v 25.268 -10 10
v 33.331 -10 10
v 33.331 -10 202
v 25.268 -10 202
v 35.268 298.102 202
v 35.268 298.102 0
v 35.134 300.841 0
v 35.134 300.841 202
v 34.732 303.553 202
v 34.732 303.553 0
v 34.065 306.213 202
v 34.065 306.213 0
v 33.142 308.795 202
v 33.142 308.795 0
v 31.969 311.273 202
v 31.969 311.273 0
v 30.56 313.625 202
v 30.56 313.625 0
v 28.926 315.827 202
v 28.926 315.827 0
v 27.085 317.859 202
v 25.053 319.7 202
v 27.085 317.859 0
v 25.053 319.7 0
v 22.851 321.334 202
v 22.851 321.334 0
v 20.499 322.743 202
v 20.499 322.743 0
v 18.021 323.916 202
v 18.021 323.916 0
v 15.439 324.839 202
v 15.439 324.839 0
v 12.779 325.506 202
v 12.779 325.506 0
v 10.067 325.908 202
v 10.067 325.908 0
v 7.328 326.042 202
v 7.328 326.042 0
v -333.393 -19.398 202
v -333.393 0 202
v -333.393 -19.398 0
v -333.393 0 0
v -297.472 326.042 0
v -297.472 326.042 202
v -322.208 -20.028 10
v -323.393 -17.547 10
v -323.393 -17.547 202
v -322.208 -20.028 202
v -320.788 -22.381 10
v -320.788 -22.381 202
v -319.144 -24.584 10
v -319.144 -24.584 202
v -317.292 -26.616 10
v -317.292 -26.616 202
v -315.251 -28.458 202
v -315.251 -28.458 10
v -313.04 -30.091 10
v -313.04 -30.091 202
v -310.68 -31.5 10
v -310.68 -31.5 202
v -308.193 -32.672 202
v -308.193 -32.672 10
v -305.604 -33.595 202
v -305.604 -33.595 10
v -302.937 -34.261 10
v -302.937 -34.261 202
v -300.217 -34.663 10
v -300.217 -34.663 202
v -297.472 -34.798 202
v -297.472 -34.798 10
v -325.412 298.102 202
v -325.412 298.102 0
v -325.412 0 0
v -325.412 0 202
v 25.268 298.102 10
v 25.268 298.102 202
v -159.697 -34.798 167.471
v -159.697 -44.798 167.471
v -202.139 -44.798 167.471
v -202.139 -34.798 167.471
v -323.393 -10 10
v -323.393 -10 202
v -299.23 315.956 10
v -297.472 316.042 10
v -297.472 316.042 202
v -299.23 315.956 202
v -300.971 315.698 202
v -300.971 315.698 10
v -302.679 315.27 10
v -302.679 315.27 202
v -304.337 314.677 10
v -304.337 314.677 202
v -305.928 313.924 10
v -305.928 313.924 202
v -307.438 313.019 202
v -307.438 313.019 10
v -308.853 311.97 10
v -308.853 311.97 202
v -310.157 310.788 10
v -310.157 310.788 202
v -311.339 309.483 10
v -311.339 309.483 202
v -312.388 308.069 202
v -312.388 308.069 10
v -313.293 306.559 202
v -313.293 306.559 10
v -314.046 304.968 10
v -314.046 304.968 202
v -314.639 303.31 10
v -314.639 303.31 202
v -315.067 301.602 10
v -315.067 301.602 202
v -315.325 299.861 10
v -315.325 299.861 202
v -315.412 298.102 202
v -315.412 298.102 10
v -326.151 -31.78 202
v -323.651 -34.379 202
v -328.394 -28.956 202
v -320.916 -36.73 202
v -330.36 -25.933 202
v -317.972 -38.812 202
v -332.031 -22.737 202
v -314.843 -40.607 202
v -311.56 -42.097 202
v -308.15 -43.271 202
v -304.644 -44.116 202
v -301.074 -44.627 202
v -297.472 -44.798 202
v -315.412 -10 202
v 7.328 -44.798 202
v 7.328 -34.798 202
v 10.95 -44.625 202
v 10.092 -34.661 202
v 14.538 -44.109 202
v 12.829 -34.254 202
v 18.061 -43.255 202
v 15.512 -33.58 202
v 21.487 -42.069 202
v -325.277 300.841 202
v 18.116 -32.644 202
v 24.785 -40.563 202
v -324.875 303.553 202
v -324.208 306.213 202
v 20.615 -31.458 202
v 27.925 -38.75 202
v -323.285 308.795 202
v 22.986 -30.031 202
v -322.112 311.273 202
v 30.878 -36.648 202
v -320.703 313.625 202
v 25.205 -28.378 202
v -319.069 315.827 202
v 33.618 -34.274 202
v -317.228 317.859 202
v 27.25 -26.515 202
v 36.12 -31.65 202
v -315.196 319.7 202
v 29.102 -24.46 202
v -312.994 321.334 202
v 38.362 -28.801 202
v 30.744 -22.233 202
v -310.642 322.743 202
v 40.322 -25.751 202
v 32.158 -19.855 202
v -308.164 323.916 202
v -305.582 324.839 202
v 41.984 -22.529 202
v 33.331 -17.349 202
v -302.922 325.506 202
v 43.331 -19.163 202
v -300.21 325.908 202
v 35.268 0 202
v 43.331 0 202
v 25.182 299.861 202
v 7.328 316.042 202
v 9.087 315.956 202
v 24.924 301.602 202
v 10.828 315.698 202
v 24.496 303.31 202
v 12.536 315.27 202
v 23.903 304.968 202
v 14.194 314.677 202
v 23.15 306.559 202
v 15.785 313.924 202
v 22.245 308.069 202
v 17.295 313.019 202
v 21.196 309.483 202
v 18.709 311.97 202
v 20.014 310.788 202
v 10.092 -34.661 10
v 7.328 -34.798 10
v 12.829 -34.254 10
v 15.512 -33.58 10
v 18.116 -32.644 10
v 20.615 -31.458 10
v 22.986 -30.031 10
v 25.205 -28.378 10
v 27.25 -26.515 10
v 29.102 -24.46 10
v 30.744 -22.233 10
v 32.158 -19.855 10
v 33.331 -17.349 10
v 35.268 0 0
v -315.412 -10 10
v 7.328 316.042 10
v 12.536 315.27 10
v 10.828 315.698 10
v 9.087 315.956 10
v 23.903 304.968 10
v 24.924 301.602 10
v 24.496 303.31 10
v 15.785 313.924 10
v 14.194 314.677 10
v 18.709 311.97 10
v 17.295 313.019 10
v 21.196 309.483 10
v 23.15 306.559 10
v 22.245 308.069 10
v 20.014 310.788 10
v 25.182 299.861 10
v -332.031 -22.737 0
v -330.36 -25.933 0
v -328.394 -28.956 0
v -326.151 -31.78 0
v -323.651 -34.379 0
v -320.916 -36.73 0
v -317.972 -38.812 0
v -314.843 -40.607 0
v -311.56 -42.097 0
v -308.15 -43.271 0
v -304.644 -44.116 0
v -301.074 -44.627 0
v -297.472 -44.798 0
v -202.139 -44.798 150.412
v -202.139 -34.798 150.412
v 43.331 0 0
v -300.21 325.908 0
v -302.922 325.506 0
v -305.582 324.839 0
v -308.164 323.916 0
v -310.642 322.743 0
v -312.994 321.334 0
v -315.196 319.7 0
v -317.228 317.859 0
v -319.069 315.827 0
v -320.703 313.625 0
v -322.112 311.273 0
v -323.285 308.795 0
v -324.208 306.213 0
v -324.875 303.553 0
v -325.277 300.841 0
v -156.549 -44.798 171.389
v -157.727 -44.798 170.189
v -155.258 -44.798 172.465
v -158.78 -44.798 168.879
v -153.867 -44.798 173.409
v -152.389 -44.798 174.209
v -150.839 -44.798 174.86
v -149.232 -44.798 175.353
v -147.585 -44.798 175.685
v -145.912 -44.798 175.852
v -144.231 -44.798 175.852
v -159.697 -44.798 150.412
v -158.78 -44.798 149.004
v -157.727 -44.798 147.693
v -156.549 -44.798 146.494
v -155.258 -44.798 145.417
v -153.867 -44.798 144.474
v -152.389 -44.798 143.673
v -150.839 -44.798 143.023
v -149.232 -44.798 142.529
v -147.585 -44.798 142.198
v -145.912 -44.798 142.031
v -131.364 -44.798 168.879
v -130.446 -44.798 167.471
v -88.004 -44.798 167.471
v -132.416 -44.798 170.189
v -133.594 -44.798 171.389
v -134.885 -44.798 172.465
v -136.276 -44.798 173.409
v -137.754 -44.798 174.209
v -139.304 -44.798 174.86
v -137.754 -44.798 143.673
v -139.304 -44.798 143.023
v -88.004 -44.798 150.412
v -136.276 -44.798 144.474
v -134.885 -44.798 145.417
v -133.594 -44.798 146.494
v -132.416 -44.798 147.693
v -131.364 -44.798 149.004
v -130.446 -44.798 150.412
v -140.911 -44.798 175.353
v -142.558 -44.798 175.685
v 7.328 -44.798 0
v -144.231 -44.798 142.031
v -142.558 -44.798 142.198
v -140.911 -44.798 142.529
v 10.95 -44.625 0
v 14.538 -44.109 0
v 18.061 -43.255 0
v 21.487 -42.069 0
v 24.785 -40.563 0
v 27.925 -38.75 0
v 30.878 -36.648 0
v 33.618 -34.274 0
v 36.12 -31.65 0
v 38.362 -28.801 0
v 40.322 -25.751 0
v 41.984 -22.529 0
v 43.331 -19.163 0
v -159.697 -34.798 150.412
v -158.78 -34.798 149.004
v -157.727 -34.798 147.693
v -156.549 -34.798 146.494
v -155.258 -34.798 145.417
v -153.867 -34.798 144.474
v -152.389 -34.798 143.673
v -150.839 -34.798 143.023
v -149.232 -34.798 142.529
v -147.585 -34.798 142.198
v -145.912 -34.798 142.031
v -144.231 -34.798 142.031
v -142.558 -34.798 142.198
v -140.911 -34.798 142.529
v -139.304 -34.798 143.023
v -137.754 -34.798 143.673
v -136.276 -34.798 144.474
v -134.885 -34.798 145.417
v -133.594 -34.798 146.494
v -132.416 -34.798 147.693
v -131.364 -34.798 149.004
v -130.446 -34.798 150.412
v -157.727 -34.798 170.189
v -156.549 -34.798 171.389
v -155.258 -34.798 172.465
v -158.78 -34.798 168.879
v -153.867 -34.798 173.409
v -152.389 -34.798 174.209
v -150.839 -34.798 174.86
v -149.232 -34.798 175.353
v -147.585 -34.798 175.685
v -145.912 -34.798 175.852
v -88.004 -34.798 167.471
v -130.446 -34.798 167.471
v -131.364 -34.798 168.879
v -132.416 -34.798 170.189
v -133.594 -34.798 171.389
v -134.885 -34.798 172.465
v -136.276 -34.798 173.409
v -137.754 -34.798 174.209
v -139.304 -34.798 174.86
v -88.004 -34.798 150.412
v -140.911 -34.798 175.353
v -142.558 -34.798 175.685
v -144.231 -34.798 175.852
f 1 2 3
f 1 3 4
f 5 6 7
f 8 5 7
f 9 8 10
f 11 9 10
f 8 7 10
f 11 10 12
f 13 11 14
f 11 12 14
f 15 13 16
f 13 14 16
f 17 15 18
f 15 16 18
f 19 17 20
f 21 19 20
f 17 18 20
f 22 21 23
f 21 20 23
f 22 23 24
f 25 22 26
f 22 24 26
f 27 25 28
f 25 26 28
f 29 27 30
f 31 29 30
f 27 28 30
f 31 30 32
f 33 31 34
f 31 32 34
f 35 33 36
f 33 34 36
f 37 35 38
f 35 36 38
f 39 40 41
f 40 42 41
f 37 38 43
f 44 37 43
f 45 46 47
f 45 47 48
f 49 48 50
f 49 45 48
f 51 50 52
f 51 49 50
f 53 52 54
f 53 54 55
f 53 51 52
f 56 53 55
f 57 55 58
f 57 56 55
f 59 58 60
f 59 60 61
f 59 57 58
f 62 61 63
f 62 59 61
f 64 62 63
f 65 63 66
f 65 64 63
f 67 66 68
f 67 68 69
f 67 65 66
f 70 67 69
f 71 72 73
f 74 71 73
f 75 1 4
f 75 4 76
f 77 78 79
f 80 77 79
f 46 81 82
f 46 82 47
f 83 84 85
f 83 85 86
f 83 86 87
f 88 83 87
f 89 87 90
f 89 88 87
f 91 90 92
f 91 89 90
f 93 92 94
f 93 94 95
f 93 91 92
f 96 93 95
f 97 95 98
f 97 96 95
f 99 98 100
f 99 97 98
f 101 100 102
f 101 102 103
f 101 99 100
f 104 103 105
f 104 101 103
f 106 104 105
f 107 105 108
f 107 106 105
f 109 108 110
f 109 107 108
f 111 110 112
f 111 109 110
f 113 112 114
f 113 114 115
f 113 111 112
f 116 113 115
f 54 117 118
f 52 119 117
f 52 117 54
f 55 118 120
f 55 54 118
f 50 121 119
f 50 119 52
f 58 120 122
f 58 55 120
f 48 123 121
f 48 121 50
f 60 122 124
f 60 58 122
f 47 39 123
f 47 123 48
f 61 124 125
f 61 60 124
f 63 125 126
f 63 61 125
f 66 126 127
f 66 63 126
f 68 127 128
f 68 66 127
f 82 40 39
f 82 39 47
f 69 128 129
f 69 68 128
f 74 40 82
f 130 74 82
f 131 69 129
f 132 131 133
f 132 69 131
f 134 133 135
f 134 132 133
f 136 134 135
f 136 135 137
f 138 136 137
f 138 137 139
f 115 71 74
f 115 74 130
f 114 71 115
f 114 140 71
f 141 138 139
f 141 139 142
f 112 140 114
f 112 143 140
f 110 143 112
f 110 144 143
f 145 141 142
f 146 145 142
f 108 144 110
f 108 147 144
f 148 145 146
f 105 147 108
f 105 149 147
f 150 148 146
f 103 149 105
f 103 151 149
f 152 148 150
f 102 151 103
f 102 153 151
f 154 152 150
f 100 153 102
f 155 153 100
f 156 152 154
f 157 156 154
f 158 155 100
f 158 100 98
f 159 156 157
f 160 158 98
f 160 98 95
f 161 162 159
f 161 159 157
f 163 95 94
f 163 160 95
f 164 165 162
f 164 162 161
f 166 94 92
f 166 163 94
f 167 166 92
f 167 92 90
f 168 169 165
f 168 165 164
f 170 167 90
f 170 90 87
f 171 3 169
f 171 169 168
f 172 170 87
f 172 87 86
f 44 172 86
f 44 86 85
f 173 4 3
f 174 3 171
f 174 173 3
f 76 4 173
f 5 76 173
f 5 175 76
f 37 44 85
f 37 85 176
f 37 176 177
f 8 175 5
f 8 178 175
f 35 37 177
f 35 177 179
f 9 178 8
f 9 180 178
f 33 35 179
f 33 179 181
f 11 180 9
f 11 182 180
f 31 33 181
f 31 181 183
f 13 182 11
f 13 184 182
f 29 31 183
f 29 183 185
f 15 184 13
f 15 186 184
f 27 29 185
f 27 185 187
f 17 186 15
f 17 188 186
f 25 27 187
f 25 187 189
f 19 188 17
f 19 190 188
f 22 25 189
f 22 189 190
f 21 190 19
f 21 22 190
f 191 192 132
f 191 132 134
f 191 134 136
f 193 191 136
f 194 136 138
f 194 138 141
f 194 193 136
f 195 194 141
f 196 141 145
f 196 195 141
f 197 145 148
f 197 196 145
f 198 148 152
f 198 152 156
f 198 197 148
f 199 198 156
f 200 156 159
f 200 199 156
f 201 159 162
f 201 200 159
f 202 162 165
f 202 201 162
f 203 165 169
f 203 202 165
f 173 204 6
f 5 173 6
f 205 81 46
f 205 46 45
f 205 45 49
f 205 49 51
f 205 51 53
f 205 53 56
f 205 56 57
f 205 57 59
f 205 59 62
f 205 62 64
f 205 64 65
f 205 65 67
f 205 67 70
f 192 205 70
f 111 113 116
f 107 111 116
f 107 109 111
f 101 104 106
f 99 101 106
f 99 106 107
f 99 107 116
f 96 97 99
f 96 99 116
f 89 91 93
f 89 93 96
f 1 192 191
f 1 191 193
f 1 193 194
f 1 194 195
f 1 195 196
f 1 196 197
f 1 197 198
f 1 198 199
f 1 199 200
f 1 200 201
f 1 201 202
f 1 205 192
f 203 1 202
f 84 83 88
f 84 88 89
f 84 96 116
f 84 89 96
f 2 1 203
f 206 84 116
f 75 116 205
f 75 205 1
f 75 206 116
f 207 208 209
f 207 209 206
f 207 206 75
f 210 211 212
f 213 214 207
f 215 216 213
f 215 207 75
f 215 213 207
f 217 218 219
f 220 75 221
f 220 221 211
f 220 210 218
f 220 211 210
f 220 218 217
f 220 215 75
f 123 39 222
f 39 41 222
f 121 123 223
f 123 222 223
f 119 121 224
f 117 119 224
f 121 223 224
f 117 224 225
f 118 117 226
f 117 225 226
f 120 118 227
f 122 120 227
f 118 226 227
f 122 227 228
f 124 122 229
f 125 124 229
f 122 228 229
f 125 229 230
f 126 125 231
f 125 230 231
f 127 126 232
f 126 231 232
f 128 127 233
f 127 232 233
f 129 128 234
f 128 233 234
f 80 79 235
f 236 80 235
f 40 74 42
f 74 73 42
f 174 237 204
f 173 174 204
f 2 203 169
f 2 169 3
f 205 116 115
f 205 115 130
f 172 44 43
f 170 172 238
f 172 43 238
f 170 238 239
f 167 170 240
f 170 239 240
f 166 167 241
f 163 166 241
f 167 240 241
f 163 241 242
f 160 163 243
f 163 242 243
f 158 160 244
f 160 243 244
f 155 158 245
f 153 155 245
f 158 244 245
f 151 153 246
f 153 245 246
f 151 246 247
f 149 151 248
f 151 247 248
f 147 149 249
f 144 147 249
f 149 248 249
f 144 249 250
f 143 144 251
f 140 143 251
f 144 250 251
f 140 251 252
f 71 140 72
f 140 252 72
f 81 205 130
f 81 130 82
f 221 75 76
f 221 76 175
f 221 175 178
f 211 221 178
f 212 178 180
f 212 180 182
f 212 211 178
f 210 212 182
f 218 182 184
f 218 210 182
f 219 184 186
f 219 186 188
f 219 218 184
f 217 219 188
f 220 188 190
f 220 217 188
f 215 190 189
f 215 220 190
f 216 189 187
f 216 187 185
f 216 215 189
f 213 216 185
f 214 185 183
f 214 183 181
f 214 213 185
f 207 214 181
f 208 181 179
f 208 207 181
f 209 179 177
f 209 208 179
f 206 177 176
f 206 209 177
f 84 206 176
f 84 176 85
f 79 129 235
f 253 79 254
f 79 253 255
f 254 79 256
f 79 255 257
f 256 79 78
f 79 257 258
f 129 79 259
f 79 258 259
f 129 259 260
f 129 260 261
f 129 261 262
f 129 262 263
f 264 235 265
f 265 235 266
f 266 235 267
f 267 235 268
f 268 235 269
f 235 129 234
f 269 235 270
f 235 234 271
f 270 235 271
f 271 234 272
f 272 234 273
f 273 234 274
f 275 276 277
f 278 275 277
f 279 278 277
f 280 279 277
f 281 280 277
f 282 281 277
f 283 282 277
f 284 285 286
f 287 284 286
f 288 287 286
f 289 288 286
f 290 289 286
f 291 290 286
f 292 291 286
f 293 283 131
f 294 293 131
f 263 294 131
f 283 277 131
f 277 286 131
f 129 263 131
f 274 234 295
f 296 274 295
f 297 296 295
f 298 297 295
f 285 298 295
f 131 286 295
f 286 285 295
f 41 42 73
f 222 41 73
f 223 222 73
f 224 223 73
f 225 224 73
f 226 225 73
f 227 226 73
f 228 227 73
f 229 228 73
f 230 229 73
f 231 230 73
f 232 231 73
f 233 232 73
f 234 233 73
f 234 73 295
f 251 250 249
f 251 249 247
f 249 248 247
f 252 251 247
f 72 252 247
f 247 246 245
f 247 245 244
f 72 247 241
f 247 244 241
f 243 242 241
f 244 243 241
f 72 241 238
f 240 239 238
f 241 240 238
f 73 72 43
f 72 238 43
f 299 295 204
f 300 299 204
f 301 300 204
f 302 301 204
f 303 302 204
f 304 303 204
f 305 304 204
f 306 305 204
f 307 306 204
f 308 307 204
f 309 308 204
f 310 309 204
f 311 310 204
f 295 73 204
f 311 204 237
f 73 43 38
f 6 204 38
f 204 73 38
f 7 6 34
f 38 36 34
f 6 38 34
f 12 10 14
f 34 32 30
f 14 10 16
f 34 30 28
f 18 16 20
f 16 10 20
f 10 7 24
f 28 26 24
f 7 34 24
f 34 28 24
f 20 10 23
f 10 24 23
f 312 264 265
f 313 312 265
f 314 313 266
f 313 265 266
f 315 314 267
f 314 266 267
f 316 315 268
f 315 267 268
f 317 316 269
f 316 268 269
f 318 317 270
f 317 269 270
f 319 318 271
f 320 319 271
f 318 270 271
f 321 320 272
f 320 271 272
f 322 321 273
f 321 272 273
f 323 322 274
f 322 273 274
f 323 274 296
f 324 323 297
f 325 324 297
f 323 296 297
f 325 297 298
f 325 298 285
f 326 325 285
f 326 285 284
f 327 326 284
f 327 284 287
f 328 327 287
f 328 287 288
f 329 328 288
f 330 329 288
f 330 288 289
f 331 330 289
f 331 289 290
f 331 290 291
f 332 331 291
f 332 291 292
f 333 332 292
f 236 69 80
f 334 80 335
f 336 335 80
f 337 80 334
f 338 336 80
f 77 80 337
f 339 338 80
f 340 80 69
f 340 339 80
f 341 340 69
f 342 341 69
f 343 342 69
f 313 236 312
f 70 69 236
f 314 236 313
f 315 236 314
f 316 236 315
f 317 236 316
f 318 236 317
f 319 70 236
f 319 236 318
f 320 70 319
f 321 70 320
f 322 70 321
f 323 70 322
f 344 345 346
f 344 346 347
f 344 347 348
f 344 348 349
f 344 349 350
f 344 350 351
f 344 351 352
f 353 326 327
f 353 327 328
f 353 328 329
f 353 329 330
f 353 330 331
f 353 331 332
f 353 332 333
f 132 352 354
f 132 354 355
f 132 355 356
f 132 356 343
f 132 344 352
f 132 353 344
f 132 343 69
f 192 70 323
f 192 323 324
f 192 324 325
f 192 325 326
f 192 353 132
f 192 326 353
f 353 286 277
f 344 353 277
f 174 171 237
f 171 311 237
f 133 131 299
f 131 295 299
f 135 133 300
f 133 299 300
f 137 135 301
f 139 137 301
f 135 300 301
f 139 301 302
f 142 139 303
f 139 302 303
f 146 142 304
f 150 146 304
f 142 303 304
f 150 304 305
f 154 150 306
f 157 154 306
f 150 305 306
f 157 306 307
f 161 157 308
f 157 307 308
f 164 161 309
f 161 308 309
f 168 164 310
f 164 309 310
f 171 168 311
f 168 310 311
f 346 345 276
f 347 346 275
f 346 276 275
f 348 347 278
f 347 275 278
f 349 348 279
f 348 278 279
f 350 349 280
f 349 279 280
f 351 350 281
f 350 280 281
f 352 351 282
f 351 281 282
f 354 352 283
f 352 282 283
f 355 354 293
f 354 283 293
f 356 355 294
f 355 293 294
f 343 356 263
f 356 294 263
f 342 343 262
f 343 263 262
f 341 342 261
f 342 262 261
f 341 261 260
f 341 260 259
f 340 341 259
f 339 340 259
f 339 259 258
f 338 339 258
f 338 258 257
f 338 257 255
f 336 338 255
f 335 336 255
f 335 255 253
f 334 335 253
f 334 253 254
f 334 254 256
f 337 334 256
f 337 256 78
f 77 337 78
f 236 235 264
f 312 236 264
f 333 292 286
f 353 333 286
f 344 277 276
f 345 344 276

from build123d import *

# Parameters (mm, degrees)
BOSS_EXTRUDE1_DEPTH = 10
BOSS_EXTRUDE2_DEPTH = 192
CUT_EXTRUDE1_DEPTH  = 192


with BuildPart() as part:
    # Sketch1 → Boss-Extrude1 (new body)
    with BuildSketch(Plane.XY):
        with BuildLine():
            Line((-325.411527203, 298.102478214), (-325.411527203, 0))
            Line((-325.411527203, 0), (-333.392551687, 0))
            Line((-333.392551687, 0), (-333.392551687, -19.397521786))
            ThreePointArc((-333.392551687, -19.397521786), (-319.468572459, -37.806041519), (-297.471527203, -44.797521786))
            Line((-297.471527203, -44.797521786), (7.328472797, -44.797521786))
            ThreePointArc((7.328472797, -44.797521786), (29.426688427, -37.734255924), (43.331435707, -19.163341521))
            Line((43.331435707, -19.163341521), (43.331435707, 0))
            Line((43.331435707, 0), (35.268472797, 0))
            Line((35.268472797, 0), (35.268472797, 298.102478214))
            ThreePointArc((35.268472797, 298.102478214), (27.085036263, 317.859041681), (7.328472797, 326.042478214))
            Line((7.328472797, 326.042478214), (-297.471527203, 326.042478214))
            ThreePointArc((-297.471527203, 326.042478214), (-317.22809067, 317.859041681), (-325.411527203, 298.102478214))
        make_face()
    extrude(amount=BOSS_EXTRUDE1_DEPTH)

    # Sketch2 → Boss-Extrude2 (add)
    with BuildSketch(Plane.XY.offset(10)):
        with BuildLine():
            Line((-325.411527203, 298.102478214), (-325.411527203, 0))
            Line((-325.411527203, 0), (-333.392551687, 0))
            Line((-333.392551687, 0), (-333.392551687, -19.397521786))
            ThreePointArc((-333.392551687, -19.397521786), (-319.468572459, -37.806041519), (-297.471527203, -44.797521786))
            Line((-297.471527203, -44.797521786), (7.328472797, -44.797521786))
            ThreePointArc((7.328472797, -44.797521786), (29.426688427, -37.734255924), (43.331435707, -19.163341521))
            Line((43.331435707, -19.163341521), (43.331435707, 0))
            Line((43.331435707, 0), (35.268472797, 0))
            Line((35.268472797, 0), (35.268472797, 298.102478214))
            ThreePointArc((35.268472797, 298.102478214), (27.085036263, 317.859041681), (7.328472797, 326.042478214))
            Line((7.328472797, 326.042478214), (-297.471527203, 326.042478214))
            ThreePointArc((-297.471527203, 326.042478214), (-317.22809067, 317.859041681), (-325.411527203, 298.102478214))
        make_face()
        with BuildLine():
            Line((-315.411527203, 298.102478214), (-315.411527203, -10))
            Line((-315.411527203, -10), (-323.392551687, -10))
            Line((-323.392551687, -10), (-323.392551687, -17.546968301))
            ThreePointArc((-323.392551687, -17.546968301), (-313.039772977, -30.090677271), (-297.471527203, -34.797521786))
            Line((-297.471527203, -34.797521786), (7.328472797, -34.797521786))
            ThreePointArc((7.328472797, -34.797521786), (22.985754076, -30.031178656), (33.331435707, -17.349090679))
            Line((33.331435707, -17.349090679), (33.331435707, -10))
            Line((33.331435707, -10), (25.268472797, -10))
            Line((25.268472797, -10), (25.268472797, 298.102478214))
            ThreePointArc((25.268472797, 298.102478214), (20.013968451, 310.787973869), (7.328472797, 316.042478214))
            Line((7.328472797, 316.042478214), (-297.471527203, 316.042478214))
            ThreePointArc((-297.471527203, 316.042478214), (-310.157022858, 310.787973869), (-315.411527203, 298.102478214))
        make_face(mode=Mode.SUBTRACT)
    extrude(amount=BOSS_EXTRUDE2_DEPTH)

    # Sketch3 → Cut-Extrude1 (cut)
    with BuildSketch(Plane.XZ.offset(44.797521786)):
        with BuildLine():
            ThreePointArc((-130.445711932, 167.470752043), (-145.071527203, 175.87248582), (-159.697342474, 167.470752043))
            Line((-159.697342474, 167.470752043), (-130.445711932, 167.470752043))
        make_face()
        with BuildLine():
            ThreePointArc((-159.697342474, 167.470752043), (-162.002770822, 158.941242201), (-159.697342474, 150.411732359))
            Line((-159.697342474, 150.411732359), (-130.445711932, 150.411732359))
            ThreePointArc((-130.445711932, 150.411732359), (-128.72679943, 154.523450388), (-128.140283584, 158.941242201))
            ThreePointArc((-128.140283584, 158.941242201), (-128.72679943, 163.359034014), (-130.445711932, 167.470752043))
            Line((-130.445711932, 167.470752043), (-159.697342474, 167.470752043))
        make_face()
        with BuildLine():
            ThreePointArc((-128.140283584, 158.941242201), (-128.72679943, 154.523450388), (-130.445711932, 150.411732359))
            Line((-130.445711932, 150.411732359), (-88.003795491, 150.411732359))
            Line((-88.003795491, 150.411732359), (-88.003795491, 167.470752043))
            Line((-88.003795491, 167.470752043), (-130.445711932, 167.470752043))
            ThreePointArc((-130.445711932, 167.470752043), (-128.72679943, 163.359034014), (-128.140283584, 158.941242201))
        make_face()
        with BuildLine():
            Line((-202.139258915, 167.470752043), (-202.139258915, 150.411732359))
            Line((-202.139258915, 150.411732359), (-159.697342474, 150.411732359))
            ThreePointArc((-159.697342474, 150.411732359), (-162.002770822, 158.941242201), (-159.697342474, 167.470752043))
            Line((-159.697342474, 167.470752043), (-202.139258915, 167.470752043))
        make_face()
        with BuildLine():
            Line((-130.445711932, 150.411732359), (-159.697342474, 150.411732359))
            ThreePointArc((-159.697342474, 150.411732359), (-145.071527203, 142.009998582), (-130.445711932, 150.411732359))
        make_face()
    extrude(amount=-CUT_EXTRUDE1_DEPTH, mode=Mode.SUBTRACT)


solid = part.part
